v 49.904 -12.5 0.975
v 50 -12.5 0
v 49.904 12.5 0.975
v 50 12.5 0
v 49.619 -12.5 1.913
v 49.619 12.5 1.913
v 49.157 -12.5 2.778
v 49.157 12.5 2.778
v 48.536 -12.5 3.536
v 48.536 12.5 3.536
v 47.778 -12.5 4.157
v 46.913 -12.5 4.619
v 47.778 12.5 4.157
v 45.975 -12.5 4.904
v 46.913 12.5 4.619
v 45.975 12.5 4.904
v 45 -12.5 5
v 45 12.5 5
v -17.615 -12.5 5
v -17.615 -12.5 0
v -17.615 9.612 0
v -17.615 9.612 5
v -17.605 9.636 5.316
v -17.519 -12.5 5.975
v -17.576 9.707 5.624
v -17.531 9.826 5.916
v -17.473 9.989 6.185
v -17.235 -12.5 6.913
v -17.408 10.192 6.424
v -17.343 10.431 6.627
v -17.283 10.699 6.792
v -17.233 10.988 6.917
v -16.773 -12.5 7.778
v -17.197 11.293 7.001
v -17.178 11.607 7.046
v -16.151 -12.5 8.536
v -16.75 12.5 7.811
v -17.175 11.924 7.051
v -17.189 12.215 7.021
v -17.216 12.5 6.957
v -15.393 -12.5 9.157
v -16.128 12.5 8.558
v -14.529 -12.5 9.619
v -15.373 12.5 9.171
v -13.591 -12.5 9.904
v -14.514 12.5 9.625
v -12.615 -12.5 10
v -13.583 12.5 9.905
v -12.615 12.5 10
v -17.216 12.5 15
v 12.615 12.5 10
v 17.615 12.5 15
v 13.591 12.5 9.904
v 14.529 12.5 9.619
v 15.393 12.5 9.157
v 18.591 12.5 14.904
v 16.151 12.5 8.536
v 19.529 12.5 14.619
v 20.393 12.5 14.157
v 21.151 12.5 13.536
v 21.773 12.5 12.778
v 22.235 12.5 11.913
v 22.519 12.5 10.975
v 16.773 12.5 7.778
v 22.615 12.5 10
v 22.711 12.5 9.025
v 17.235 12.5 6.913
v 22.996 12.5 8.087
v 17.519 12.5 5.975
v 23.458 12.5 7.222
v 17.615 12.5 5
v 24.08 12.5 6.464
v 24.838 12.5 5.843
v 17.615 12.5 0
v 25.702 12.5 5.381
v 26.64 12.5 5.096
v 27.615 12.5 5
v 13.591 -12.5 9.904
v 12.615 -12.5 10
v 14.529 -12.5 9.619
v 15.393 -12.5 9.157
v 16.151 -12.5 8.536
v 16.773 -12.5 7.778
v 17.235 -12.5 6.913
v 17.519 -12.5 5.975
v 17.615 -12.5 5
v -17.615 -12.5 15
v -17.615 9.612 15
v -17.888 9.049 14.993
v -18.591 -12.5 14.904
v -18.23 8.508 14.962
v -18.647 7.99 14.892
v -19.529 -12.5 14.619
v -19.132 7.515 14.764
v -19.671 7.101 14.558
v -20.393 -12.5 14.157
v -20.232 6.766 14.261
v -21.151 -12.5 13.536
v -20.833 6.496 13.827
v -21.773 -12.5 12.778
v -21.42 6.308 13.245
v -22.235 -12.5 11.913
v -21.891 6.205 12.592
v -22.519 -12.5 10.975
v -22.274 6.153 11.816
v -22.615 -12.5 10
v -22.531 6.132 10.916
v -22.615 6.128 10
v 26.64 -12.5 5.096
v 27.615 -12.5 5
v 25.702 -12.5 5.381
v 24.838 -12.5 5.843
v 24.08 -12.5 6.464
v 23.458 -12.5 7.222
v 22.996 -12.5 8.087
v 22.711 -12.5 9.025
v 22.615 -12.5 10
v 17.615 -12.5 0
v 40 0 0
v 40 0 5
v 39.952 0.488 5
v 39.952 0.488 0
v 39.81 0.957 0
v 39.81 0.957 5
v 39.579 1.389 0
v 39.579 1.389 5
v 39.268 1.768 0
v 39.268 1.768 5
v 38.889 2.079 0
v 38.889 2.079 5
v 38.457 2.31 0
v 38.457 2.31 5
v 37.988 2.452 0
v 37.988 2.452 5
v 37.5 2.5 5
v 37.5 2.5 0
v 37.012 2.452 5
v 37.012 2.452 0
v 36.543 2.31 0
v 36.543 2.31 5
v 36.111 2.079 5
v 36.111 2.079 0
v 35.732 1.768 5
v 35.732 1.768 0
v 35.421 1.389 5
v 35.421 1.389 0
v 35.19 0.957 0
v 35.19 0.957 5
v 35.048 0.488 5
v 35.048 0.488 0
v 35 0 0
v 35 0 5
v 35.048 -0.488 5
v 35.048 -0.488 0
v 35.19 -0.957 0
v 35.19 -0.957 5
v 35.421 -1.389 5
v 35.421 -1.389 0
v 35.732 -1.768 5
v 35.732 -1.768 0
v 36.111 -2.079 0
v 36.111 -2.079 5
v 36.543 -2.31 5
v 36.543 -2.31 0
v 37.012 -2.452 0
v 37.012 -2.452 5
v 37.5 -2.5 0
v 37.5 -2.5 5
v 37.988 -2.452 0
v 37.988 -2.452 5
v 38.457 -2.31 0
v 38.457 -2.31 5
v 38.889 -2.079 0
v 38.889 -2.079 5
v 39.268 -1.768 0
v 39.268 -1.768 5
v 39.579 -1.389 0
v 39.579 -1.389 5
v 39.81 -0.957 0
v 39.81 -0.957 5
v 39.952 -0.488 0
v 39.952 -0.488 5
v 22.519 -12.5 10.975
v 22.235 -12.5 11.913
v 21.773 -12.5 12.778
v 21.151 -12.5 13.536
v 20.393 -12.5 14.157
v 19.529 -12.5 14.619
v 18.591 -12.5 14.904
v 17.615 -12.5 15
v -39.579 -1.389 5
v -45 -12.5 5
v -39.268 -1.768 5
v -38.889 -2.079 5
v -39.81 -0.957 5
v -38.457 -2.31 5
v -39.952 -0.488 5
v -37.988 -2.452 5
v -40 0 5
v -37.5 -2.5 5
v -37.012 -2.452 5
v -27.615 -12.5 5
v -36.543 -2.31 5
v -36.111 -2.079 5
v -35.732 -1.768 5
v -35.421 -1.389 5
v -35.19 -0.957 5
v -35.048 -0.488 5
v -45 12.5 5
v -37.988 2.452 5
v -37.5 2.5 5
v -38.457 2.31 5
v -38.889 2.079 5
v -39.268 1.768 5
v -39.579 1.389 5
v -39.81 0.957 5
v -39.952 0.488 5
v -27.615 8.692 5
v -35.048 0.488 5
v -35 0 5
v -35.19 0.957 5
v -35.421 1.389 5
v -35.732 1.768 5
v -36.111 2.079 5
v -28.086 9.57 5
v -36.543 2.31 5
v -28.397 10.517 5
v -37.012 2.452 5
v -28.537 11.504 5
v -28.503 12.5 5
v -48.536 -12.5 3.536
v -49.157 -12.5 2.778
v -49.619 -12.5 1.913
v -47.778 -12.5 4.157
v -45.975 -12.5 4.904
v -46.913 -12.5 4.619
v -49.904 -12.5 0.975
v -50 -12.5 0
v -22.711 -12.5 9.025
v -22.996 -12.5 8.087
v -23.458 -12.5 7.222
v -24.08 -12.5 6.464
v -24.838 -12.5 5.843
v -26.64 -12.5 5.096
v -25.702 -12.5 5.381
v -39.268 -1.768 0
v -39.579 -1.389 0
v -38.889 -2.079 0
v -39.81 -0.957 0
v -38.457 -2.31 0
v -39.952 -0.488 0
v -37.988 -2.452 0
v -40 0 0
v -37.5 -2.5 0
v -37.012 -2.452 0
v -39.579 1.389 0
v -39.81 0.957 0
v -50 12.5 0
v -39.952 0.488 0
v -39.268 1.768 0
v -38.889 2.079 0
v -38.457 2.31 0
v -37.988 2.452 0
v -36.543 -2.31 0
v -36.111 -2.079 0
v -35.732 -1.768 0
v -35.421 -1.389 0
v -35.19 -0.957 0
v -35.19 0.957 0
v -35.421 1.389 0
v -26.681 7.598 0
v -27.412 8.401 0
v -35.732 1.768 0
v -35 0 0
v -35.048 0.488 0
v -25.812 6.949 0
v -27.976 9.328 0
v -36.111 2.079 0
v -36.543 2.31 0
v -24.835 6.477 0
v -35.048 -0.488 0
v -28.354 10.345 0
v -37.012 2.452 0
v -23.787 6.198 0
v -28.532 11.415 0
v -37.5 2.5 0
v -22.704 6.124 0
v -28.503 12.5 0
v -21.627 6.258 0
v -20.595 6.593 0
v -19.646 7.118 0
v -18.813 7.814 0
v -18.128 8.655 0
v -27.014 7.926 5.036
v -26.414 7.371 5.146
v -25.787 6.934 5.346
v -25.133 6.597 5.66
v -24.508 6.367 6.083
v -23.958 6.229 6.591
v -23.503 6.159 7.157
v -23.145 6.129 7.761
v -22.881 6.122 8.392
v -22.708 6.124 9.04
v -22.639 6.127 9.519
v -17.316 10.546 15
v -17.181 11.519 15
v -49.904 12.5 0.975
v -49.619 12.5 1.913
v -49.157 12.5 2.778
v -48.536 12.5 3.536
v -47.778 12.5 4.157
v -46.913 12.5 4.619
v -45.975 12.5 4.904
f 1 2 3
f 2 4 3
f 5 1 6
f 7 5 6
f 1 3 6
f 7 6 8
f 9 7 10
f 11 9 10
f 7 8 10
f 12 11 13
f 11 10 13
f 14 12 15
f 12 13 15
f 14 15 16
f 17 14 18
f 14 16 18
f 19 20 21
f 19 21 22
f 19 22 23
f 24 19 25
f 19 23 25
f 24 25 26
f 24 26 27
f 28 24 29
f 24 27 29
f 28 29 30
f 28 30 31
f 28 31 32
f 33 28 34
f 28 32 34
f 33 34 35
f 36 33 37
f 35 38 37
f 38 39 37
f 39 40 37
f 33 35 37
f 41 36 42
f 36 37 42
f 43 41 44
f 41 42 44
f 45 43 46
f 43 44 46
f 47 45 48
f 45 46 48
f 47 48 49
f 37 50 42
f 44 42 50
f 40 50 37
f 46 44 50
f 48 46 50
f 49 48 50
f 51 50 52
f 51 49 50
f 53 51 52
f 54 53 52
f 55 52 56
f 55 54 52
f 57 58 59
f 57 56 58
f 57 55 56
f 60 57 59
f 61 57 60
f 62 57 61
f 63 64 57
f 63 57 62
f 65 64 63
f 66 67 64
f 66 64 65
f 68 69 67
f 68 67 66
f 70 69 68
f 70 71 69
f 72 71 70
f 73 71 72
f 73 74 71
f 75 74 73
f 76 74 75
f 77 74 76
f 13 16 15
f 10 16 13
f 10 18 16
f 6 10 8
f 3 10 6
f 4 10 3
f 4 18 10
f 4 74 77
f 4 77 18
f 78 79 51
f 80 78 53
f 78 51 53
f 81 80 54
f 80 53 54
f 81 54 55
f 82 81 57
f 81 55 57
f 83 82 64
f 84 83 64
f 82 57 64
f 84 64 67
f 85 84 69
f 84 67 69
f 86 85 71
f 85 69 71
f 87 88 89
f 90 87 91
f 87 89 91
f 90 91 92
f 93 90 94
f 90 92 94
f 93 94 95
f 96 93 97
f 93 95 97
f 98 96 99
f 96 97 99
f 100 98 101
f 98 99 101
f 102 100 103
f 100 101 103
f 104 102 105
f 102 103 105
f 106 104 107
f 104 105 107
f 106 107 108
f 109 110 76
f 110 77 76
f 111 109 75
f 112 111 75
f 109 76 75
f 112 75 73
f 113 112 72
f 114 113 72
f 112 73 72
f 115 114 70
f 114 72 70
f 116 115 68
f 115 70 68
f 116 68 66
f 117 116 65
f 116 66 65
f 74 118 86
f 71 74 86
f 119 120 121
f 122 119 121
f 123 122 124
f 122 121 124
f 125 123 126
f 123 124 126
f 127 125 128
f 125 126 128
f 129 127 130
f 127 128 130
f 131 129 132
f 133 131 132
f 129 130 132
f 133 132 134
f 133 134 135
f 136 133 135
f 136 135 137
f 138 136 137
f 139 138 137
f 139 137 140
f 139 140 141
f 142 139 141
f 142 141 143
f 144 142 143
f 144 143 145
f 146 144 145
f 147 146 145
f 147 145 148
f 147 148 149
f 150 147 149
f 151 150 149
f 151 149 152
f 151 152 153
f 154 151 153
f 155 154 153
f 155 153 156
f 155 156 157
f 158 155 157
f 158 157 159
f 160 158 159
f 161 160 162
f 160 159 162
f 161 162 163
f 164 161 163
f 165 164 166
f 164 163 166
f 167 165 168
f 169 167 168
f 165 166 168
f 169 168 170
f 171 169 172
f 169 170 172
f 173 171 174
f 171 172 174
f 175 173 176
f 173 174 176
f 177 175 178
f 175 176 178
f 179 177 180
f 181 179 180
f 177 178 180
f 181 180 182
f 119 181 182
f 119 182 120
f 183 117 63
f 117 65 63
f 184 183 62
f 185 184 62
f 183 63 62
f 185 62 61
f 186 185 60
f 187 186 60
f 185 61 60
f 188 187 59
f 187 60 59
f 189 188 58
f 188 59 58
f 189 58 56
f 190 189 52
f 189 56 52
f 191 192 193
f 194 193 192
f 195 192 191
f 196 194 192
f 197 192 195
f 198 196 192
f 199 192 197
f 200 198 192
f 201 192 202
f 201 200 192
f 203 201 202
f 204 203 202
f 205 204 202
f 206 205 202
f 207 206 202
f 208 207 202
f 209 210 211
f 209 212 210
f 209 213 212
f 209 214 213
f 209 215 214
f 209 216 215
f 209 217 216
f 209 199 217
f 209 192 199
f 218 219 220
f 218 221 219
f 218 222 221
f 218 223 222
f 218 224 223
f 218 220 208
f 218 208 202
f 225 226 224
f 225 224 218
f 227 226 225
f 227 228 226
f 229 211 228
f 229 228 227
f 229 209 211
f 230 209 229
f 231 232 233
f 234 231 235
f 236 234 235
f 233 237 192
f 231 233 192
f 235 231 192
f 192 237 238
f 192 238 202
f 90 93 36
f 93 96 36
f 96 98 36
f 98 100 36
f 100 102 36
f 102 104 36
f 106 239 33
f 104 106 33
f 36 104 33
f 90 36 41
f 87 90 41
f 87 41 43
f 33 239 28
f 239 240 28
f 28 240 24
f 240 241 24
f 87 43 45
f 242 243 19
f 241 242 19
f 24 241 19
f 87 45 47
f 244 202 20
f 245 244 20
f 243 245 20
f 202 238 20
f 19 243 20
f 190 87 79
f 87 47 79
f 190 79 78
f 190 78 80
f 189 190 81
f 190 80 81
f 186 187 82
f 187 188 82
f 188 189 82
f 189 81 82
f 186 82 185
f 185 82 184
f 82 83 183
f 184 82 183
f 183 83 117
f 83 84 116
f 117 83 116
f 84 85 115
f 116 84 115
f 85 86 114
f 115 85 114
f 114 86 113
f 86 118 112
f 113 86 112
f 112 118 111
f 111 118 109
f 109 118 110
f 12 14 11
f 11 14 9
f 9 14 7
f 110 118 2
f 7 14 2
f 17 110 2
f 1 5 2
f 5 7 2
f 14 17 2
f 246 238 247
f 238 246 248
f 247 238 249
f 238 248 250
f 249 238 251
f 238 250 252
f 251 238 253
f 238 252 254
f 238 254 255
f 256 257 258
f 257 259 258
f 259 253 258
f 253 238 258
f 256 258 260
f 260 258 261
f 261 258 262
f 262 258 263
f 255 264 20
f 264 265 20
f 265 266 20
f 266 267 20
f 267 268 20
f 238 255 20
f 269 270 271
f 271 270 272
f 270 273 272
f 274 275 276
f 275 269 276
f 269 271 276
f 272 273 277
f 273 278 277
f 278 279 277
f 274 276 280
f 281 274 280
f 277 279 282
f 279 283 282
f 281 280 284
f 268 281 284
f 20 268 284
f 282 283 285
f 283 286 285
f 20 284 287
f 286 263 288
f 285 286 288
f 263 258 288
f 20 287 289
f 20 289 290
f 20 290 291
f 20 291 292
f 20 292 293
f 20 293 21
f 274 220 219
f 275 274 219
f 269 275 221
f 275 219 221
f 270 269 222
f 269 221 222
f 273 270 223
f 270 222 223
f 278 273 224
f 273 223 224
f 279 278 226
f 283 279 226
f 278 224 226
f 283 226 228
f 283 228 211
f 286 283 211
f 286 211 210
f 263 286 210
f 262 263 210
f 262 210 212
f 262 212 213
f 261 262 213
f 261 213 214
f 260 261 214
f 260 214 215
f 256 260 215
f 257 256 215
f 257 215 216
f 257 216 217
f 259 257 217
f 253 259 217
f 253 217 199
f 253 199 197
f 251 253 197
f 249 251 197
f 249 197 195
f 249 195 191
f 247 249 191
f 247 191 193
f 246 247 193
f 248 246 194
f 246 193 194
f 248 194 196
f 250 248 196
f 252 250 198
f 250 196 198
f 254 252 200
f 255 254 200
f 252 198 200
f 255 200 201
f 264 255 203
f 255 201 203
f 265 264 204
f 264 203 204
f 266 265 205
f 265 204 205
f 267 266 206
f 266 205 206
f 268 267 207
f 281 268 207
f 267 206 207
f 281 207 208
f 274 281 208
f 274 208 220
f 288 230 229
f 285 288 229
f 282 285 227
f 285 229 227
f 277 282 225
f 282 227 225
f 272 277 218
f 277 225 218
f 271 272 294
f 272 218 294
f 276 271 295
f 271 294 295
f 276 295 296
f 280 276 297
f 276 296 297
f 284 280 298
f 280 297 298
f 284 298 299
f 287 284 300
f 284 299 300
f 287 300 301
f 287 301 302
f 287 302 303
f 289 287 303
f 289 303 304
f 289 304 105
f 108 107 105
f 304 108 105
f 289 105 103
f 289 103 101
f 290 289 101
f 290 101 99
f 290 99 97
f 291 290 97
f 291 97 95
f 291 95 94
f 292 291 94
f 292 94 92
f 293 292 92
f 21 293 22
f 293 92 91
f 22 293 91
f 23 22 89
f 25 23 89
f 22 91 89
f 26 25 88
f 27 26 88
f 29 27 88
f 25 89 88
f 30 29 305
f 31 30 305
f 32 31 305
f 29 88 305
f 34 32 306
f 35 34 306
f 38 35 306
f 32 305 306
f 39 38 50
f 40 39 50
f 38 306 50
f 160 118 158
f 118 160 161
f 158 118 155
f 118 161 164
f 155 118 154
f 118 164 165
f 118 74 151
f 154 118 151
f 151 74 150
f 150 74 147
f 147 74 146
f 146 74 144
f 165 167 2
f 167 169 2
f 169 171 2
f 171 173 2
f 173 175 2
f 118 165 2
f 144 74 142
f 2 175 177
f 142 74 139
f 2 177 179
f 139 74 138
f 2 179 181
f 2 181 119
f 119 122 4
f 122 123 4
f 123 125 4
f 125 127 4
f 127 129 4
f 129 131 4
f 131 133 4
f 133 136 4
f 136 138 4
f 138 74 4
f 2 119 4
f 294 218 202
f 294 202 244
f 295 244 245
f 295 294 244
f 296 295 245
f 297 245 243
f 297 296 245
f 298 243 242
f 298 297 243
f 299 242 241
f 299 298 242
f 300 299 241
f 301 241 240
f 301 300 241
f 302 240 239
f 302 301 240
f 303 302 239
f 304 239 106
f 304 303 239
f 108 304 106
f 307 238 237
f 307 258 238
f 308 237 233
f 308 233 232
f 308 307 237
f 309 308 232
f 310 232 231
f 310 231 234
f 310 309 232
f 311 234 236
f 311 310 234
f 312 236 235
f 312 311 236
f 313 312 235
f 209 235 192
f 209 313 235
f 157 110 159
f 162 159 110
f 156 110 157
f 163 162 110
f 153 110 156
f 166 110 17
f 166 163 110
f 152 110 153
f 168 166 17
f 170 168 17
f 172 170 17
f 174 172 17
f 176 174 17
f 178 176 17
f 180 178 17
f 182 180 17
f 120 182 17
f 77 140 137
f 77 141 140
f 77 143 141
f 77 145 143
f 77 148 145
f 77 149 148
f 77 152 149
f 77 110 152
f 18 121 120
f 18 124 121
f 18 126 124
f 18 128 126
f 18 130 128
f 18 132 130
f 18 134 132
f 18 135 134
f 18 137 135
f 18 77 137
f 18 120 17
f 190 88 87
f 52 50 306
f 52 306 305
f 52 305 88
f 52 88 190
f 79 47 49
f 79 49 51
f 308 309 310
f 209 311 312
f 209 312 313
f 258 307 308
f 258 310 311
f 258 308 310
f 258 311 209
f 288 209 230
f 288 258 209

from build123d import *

# Parameters (mm, degrees)
F0_W      = 100
F0_H      = 25
F1_DEPTH  = 5
F2_R      = 2.5
F3_DEPTH  = 25
F4_W      = 45.2307462692
F4_H      = 25
F5_DEPTH  = 10
F6_W      = 35.2307462692
F6_H      = 20
F7_DEPTH  = 78
F8_R      = 4.99999
F9_R      = 5.6856472889
F10_DEPTH = 12.5


# Not quite as in the source:
# - a fillet or chamfer is up to 0.001 mm smaller than in the source, because OpenCascade refuses the exact size


with BuildPart() as f1:
    # F0 (on Top) → F1 (new body)
    with BuildSketch(Plane.XY):
        Rectangle(F0_W, F0_H)
    extrude(amount=F1_DEPTH)

    # F2 (on face) → F3 (cut)
    with BuildSketch(Plane.XY.offset(5)):
        with Locations((-37.5, 0)):
            Circle(F2_R)
        with Locations((37.5, 0)):
            Circle(F2_R)
    extrude(amount=-F3_DEPTH, mode=Mode.SUBTRACT)

    # F4 (on face) → F5 (join)
    with BuildSketch(Plane.XY.offset(5)):
        Rectangle(F4_W, F4_H)
    extrude(amount=F5_DEPTH)

    # F6 (on face) → F7 (cut)
    with BuildSketch(Plane.XZ.offset(12.5)):
        Rectangle(F6_W, F6_H)
    extrude(amount=-F7_DEPTH, mode=Mode.SUBTRACT)

    # F8 (radius 5 in the source; OpenCascade refuses exactly that, so slightly less here)
    f8_edges = [f1.edges().sort_by_distance(p)[0] for p in [
        (22.615373, 0, 5),
        (-22.615373, 0, 5),
        (-22.615373, 0, 15),
        (22.615373, 0, 15),
        (50, 0, 5),
        (-50, 0, 5),
        (-17.615373, 0, 10),
        (17.615373, 0, 10),
    ]]
    fillet(f8_edges, radius=F8_R)

    # F9 (on face) → F10 (cut, symmetric)
    with BuildSketch(Plane.XY.offset(5)):
        with Locations((-22.8596497327, 11.807994917)):
            Circle(F9_R)
    extrude(amount=F10_DEPTH, both=True, mode=Mode.SUBTRACT)


solid = f1.part
